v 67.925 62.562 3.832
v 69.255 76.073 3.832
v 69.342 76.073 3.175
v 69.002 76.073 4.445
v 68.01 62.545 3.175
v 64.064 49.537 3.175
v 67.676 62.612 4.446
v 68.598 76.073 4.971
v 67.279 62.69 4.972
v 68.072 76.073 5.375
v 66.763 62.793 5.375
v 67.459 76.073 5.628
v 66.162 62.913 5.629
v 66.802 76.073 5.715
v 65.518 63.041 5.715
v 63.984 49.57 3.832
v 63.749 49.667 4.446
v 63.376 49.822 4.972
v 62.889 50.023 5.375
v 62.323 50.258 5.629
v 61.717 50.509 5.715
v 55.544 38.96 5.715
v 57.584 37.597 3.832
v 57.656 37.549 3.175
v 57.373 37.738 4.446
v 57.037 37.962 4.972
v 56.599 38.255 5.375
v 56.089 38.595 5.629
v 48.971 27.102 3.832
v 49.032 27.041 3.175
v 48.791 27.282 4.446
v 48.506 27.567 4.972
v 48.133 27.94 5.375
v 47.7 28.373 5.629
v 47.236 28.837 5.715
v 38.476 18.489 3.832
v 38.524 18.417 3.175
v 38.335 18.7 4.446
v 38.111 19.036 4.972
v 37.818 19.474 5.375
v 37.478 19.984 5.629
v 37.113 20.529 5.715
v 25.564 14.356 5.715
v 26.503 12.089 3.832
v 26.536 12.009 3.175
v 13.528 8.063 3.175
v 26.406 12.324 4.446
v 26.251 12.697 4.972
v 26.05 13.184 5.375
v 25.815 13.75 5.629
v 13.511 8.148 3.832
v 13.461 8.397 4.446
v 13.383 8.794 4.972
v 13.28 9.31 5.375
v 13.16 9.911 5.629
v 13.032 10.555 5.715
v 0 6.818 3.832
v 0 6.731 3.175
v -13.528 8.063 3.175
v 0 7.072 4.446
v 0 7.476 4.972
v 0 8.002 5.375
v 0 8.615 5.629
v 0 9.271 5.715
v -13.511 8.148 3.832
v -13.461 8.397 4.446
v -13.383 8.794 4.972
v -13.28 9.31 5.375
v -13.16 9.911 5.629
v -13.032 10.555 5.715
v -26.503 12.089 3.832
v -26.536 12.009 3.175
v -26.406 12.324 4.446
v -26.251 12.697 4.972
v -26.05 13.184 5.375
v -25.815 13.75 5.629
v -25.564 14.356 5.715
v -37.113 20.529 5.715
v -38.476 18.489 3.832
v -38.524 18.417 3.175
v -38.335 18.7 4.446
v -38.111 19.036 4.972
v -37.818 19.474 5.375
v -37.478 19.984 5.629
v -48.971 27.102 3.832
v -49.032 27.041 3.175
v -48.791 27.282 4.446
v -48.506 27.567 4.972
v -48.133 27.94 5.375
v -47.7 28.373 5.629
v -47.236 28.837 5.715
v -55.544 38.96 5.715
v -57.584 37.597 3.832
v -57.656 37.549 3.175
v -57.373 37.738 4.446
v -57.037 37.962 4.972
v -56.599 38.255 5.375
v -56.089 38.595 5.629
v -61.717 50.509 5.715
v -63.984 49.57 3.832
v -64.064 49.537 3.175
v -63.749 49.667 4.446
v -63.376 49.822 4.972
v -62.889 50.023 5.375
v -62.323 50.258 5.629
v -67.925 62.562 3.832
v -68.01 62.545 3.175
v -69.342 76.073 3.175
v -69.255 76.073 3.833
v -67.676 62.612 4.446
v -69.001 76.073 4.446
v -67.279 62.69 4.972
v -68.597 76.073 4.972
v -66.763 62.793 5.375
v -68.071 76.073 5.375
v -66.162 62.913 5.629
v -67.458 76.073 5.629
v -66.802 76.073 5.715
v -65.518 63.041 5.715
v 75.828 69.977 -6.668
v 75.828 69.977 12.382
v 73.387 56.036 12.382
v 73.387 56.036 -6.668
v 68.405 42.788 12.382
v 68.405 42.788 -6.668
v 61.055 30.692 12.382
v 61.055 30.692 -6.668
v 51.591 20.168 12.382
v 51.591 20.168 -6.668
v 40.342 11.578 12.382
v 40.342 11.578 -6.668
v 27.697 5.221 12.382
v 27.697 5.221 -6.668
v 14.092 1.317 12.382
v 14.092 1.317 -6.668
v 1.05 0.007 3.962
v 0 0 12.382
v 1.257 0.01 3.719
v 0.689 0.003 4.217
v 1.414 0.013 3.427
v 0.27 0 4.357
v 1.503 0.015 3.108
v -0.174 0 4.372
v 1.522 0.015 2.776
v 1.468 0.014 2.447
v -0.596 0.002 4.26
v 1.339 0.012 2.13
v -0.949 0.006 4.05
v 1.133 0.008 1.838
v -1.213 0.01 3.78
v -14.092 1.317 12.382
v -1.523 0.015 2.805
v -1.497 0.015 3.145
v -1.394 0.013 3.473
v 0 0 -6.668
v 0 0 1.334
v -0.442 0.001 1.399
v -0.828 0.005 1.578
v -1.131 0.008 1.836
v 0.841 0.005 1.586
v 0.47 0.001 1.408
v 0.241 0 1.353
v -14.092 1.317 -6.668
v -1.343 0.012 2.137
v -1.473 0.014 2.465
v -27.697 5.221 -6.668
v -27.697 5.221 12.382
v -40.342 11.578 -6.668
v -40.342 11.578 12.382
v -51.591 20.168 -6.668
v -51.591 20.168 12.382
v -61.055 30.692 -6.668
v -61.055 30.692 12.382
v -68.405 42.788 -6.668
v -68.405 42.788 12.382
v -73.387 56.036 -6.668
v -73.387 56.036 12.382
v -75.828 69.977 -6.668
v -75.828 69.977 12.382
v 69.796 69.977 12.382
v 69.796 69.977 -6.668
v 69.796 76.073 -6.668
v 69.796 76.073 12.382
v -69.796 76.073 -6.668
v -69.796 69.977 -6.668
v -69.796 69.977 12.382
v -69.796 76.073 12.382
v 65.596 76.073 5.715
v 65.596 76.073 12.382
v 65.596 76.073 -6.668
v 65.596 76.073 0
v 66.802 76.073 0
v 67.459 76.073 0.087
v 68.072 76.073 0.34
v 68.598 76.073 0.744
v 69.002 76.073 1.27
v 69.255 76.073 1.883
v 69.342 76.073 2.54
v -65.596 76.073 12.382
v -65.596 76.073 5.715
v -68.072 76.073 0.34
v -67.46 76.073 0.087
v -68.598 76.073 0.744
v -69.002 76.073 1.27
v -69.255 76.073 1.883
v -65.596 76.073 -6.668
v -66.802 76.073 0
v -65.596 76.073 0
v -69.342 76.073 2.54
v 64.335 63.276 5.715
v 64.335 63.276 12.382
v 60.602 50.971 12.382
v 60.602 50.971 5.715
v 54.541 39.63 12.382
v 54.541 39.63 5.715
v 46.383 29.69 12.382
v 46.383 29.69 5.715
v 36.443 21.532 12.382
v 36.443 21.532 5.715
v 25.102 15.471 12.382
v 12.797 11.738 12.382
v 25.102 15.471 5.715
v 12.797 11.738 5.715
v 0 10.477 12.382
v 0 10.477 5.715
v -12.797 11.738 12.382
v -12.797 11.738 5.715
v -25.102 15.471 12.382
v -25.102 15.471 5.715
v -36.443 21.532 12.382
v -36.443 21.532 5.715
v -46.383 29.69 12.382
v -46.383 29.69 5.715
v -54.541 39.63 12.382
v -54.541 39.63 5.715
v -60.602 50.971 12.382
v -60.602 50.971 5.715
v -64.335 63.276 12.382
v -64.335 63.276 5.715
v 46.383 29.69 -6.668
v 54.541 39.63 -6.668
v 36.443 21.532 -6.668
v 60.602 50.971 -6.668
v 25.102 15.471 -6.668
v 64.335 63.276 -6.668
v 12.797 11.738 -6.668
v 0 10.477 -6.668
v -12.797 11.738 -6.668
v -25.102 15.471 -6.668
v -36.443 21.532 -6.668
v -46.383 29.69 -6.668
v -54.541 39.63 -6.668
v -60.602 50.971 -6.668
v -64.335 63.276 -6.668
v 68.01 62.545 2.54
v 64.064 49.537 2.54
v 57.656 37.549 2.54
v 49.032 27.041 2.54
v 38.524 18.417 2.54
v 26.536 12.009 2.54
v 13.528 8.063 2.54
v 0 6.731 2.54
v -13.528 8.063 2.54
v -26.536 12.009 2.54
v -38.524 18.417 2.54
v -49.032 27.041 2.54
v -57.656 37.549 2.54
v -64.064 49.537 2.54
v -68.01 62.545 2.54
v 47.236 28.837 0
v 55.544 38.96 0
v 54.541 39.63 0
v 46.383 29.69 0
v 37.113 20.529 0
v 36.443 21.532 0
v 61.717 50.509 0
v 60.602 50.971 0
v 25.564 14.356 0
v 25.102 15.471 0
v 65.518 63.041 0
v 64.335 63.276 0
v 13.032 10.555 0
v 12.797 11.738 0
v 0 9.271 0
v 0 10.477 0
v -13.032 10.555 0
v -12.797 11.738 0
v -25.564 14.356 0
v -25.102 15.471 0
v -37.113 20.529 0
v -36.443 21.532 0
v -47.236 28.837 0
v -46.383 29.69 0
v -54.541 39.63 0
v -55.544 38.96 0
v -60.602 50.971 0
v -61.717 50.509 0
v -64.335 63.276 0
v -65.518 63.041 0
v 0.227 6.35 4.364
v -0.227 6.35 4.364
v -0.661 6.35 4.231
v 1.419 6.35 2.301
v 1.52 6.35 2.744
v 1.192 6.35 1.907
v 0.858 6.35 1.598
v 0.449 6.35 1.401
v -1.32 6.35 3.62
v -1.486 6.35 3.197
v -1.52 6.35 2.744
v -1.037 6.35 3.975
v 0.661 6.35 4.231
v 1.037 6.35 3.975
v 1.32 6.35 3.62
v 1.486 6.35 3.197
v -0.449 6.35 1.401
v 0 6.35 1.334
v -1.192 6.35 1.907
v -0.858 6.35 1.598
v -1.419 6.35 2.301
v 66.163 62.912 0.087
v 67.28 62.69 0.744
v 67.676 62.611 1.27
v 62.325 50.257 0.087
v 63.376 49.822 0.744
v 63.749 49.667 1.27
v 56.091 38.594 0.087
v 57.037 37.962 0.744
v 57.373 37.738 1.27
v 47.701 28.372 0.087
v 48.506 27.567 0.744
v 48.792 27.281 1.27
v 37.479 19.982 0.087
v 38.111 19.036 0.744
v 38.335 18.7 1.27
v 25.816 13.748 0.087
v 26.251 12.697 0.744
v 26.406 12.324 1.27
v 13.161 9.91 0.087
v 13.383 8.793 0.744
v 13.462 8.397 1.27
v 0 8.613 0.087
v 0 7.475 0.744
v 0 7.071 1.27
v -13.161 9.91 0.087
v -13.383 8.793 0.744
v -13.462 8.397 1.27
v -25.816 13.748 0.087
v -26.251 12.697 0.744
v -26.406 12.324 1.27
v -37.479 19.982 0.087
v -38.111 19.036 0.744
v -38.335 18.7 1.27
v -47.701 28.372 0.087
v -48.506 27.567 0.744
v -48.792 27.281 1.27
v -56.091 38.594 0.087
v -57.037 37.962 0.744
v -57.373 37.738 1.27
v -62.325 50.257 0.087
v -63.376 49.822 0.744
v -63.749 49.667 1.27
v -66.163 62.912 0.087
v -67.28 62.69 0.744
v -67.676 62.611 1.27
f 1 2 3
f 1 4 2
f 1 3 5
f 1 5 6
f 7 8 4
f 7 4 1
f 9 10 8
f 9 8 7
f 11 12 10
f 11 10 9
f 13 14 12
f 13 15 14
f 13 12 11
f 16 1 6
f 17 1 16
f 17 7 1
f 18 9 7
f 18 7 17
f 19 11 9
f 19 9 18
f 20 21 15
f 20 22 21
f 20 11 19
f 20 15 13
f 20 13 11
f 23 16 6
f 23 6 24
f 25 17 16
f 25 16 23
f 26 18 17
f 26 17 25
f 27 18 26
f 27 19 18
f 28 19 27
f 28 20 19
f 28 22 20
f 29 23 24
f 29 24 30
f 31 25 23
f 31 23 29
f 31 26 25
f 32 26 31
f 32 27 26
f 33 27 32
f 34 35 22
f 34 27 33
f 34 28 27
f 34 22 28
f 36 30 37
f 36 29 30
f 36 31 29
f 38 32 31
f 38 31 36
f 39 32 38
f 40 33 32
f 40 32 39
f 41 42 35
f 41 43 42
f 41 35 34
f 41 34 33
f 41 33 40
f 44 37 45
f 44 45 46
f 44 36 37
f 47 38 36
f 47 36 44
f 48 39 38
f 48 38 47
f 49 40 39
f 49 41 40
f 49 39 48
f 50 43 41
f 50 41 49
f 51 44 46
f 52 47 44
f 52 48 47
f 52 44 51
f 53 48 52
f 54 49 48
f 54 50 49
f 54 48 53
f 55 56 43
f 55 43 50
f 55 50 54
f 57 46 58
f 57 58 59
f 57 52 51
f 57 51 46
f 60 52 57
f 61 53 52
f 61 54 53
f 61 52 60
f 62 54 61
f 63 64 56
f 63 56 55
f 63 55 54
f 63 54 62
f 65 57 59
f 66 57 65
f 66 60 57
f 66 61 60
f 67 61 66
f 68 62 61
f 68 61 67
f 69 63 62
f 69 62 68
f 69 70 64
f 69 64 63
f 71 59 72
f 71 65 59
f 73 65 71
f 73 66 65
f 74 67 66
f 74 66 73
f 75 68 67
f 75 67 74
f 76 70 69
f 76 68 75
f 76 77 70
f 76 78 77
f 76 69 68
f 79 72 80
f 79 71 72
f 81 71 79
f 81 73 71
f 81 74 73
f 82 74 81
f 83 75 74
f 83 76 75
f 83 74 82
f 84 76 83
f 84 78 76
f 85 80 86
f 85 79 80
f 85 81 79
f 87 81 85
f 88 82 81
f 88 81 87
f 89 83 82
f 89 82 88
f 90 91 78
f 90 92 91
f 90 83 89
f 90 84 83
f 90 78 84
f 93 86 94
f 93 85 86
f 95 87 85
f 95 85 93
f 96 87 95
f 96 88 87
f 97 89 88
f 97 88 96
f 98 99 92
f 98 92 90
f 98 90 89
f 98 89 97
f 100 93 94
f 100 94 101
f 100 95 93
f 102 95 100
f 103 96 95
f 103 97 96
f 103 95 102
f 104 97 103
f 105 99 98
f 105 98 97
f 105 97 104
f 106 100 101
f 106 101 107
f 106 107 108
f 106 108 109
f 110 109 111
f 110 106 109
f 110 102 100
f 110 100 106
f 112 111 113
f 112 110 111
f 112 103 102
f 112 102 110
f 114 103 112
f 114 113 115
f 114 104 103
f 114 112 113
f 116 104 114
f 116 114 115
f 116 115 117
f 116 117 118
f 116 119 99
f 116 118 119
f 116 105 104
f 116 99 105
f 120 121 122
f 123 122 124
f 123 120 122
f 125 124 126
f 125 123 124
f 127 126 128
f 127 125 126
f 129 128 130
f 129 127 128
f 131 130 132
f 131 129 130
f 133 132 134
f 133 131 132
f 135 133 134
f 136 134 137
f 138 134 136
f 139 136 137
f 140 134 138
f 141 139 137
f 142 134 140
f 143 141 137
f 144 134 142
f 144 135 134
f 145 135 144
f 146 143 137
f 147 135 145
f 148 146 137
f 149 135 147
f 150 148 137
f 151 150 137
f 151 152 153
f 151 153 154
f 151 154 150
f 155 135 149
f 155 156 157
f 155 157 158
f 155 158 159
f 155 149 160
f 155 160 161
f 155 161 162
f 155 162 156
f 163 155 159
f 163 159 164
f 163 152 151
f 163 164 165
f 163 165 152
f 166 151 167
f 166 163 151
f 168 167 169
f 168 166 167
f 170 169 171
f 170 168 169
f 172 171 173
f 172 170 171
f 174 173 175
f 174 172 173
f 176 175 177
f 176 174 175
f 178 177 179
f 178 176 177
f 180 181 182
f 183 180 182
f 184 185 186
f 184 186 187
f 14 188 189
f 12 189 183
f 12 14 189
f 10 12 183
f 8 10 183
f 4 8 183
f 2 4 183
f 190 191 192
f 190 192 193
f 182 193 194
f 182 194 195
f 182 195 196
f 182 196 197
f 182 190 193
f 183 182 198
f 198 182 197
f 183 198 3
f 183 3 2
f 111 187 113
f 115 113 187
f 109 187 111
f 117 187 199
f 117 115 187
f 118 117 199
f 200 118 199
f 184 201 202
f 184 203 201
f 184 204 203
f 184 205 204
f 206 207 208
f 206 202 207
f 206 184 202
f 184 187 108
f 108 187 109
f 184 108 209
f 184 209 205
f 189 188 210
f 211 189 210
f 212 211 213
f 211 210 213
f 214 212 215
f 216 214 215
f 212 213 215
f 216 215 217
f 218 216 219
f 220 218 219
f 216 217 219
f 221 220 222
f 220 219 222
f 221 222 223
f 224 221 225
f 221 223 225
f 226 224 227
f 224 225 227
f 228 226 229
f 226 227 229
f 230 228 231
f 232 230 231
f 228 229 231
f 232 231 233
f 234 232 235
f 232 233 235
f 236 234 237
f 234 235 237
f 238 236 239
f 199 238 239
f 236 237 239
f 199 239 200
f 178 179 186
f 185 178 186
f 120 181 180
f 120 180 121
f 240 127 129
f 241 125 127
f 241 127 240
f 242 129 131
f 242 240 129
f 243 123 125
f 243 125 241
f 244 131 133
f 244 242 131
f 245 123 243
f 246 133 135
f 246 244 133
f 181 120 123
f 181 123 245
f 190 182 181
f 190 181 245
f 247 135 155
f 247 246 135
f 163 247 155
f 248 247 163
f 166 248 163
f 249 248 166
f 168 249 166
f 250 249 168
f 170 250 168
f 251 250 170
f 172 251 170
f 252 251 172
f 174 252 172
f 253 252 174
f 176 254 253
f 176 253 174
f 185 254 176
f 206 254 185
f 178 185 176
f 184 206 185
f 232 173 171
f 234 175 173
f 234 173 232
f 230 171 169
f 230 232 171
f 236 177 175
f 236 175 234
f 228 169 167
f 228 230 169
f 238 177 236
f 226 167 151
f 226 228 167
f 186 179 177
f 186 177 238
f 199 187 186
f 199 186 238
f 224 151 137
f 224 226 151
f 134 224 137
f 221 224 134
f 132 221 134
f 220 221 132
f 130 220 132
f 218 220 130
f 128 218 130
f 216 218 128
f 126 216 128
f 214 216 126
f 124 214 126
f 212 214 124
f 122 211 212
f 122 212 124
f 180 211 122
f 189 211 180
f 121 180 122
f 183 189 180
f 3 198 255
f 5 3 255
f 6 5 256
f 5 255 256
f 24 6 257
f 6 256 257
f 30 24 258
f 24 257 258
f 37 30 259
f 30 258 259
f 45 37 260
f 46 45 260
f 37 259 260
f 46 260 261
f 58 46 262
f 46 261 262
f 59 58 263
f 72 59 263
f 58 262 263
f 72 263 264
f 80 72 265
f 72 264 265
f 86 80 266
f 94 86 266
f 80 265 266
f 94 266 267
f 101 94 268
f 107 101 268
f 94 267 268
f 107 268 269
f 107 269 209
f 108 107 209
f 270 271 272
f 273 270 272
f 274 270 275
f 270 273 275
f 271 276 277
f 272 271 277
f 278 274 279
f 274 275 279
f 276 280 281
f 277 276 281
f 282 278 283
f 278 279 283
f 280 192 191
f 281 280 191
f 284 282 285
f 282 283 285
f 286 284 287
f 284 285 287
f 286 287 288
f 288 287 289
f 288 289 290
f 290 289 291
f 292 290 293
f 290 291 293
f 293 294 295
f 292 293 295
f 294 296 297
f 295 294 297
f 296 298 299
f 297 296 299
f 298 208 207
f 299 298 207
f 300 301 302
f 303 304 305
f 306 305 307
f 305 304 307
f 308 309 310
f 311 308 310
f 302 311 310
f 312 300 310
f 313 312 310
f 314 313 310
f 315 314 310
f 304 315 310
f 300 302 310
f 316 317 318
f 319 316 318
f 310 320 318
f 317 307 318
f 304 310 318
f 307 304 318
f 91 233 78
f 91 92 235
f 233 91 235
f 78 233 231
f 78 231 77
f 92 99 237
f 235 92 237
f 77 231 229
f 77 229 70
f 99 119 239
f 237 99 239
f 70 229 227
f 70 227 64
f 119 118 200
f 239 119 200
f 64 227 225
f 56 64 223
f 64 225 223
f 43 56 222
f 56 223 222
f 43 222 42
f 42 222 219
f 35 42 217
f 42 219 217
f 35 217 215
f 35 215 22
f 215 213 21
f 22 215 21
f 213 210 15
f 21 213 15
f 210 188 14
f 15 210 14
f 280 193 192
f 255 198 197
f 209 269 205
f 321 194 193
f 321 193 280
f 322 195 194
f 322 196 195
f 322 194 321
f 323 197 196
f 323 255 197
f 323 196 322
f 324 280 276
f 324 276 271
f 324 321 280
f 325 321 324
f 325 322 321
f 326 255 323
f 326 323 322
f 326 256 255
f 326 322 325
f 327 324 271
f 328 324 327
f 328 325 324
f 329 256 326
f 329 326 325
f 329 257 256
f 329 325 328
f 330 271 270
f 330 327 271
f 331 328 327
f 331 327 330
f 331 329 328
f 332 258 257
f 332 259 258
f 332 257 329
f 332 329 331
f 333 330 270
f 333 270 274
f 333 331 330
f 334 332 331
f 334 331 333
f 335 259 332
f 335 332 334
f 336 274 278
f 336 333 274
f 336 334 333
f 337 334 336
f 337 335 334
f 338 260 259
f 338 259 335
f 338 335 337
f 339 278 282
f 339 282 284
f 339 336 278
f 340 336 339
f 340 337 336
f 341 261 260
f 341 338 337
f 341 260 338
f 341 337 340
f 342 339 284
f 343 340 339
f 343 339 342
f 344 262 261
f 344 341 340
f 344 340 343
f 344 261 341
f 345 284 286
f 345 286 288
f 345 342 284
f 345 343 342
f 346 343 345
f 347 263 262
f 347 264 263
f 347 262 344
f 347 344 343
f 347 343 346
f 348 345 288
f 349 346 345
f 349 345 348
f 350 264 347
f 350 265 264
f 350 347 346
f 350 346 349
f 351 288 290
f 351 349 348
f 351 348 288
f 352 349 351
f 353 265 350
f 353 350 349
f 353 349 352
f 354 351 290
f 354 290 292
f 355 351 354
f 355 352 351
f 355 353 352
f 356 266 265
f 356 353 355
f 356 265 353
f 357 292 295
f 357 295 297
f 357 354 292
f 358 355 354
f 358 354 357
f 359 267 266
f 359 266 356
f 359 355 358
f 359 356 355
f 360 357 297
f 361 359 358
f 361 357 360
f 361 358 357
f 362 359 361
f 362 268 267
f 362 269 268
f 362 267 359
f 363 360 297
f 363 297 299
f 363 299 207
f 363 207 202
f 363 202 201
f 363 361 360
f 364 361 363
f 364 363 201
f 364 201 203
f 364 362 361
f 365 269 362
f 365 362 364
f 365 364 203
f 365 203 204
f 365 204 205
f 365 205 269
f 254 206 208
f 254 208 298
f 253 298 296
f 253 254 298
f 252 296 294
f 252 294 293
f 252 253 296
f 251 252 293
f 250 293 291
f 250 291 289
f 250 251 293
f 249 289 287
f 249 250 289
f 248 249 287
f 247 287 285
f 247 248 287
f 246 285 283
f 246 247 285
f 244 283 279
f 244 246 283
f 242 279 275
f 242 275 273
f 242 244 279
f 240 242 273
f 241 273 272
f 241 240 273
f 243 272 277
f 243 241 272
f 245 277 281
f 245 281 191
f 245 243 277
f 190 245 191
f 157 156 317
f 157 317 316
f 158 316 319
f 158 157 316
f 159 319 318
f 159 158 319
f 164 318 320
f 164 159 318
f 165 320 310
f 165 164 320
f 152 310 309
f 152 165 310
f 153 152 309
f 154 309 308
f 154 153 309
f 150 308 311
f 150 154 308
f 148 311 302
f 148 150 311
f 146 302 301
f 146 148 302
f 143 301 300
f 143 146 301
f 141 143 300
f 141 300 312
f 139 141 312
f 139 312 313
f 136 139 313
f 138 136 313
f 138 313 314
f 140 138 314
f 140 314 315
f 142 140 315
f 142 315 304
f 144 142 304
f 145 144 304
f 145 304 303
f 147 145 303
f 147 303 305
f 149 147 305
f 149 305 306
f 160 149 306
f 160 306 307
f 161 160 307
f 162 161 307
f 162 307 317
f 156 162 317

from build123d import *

# Parameters (mm, degrees)
BOSS_EXTRUDE1_DEPTH = 5.715
BOSS_EXTRUDE2_DEPTH = 6.6675
BOSS_EXTRUDE3_START = 6.6675
BOSS_EXTRUDE3_DEPTH = 6.6675
FILLET1_R           = 2.54
SKETCH5_R           = 1.524
CUT_EXTRUDE1_DEPTH  = 6.35
SKETCH6_W           = 6.0325
SKETCH6_H           = 6.096
CUT_EXTRUDE2_DEPTH  = 110.257060148
SKETCH7_W           = 13.176307298
SKETCH7_H           = 9.310122243
CUT_EXTRUDE3_DEPTH  = 110.257060009


with BuildPart() as part:
    # Sketch1 → Boss-Extrude1 (new body)
    with BuildSketch(Plane.XY):
        with BuildLine():
            ThreePointArc((69.342, 76.073), (0, 6.731), (-69.342, 76.073))
            Line((-69.342, 76.073), (-76.073, 76.073))
            ThreePointArc((-76.073, 76.073), (0, 0), (76.073, 76.073))
            Line((76.073, 76.073), (69.342, 76.073))
        make_face()
    extrude(amount=BOSS_EXTRUDE1_DEPTH)

    # Sketch3 → Boss-Extrude2 (add)
    with BuildSketch(Plane.XY.offset(5.715)):
        with BuildLine():
            ThreePointArc((65.5955, 76.073), (0, 10.4775), (-65.5955, 76.073))
            Line((-65.5955, 76.073), (-69.342, 76.073))
            ThreePointArc((-69.342, 76.073), (0, 6.731), (69.342, 76.073))
            Line((69.342, 76.073), (65.5955, 76.073))
        make_face()
        with BuildLine():
            Line((76.073, 76.073), (69.342, 76.073))
            ThreePointArc((69.342, 76.073), (0, 6.731), (-69.342, 76.073))
            Line((-69.342, 76.073), (-76.073, 76.073))
            ThreePointArc((-76.073, 76.073), (0, 0), (76.073, 76.073))
        make_face()
    extrude(amount=BOSS_EXTRUDE2_DEPTH)

    # Sketch4 → Boss-Extrude3 (add)
    with BuildSketch(Plane(origin=(0, 0, 0), x_dir=(-1, 0, 0), z_dir=(0, 0, -1)).offset(BOSS_EXTRUDE3_START)):
        with BuildLine():
            ThreePointArc((65.5955, 76.073), (0, 10.4775), (-65.5955, 76.073))
            Line((-65.5955, 76.073), (-69.342, 76.073))
            ThreePointArc((-69.342, 76.073), (0, 6.731), (69.342, 76.073))
            Line((69.342, 76.073), (65.5955, 76.073))
        make_face()
        with BuildLine():
            Line((76.073, 76.073), (69.342, 76.073))
            ThreePointArc((69.342, 76.073), (0, 6.731), (-69.342, 76.073))
            Line((-69.342, 76.073), (-76.073, 76.073))
            ThreePointArc((-76.073, 76.073), (0, 0), (76.073, 76.073))
        make_face()
    extrude(amount=-BOSS_EXTRUDE3_DEPTH)

    # Fillet1
    fillet1_edges = [part.edges().sort_by_distance(p)[0] for p in [
        (0, 6.731, 5.715),
        (0, 6.731, 0),
    ]]
    fillet(fillet1_edges, radius=FILLET1_R)

    # Sketch5 → Cut-Extrude1 (cut)
    with BuildSketch(Plane(origin=(0, 0, 0), x_dir=(1, 0, 0), z_dir=(0, 1, 0))):
        with Locations(Location((0, -2.8575, 0), (0, 0, 90))):
            Circle(SKETCH5_R)
    extrude(amount=CUT_EXTRUDE1_DEPTH, mode=Mode.SUBTRACT)

    # Sketch6 → Cut-Extrude2 (cut, through all)
    with BuildSketch(Plane.XY.offset(12.3825)):
        with BuildLine():
            Line((-82.07762594, 69.977), (-75.828359556, 69.977))
            ThreePointArc((-75.828359556, 69.977), (-76.011815284, 73.022546552), (-76.073, 76.073))
            Line((-76.073, 76.073), (-82.07762594, 76.073))
            Line((-82.07762594, 76.073), (-82.07762594, 69.977))
        make_face()
        with Locations((-72.812109556, 73.025)):
            Rectangle(SKETCH6_W, SKETCH6_H)
        with BuildLine():
            ThreePointArc((76.073, 76.073), (76.011815284, 73.022546552), (75.828359556, 69.977))
            Line((75.828359556, 69.977), (82.07762594, 69.977))
            Line((82.07762594, 69.977), (82.07762594, 76.073))
            Line((82.07762594, 76.073), (76.073, 76.073))
        make_face()
        with Locations((72.812109556, 73.025)):
            Rectangle(SKETCH6_W, SKETCH6_H)
    extrude(amount=-CUT_EXTRUDE2_DEPTH, mode=Mode.SUBTRACT)


with BuildPart() as cut_extrude2_piece_1:
    # of the separate pieces the step leaves, piece 1, a body of its own (cut_extrude2_pieces)
    add(part.part.solids().sort_by_distance((66.802, 76.073, 5.715))[0])


with BuildPart() as cut_extrude2_piece_2:
    # of the separate pieces the step leaves, piece 2, a body of its own (cut_extrude2_pieces)
    add(part.part.solids().sort_by_distance((75.828359556, 76.073, 12.3825))[0])


with BuildPart() as cut_extrude2_piece_3:
    # of the separate pieces the step leaves, piece 3, a body of its own (cut_extrude2_pieces)
    add(part.part.solids().sort_by_distance((-76.073, 76.073, 12.3825))[0])


with BuildPart() as cut_extrude3_tool:
    # Sketch7 → Cut-Extrude3 (new, through all)
    with BuildSketch(Plane.XY.offset(12.3825)):
        with Locations((-79.400263205, 74.632061122)):
            Rectangle(SKETCH7_W, SKETCH7_H)
        with Locations((79.400263205, 74.632061122)):
            Rectangle(SKETCH7_W, SKETCH7_H)
    extrude(amount=-CUT_EXTRUDE3_DEPTH)


with BuildPart() as cut_extrude2_piece_2_1:
    add(cut_extrude2_piece_2.part)

    # Cut-Extrude3: cut by cut_extrude3_tool
    add(cut_extrude3_tool.part, mode=Mode.SUBTRACT)


with BuildPart() as cut_extrude2_piece_3_1:
    add(cut_extrude2_piece_3.part)

    # Cut-Extrude3: cut by cut_extrude3_tool
    add(cut_extrude3_tool.part, mode=Mode.SUBTRACT)


solid = cut_extrude2_piece_1.part
